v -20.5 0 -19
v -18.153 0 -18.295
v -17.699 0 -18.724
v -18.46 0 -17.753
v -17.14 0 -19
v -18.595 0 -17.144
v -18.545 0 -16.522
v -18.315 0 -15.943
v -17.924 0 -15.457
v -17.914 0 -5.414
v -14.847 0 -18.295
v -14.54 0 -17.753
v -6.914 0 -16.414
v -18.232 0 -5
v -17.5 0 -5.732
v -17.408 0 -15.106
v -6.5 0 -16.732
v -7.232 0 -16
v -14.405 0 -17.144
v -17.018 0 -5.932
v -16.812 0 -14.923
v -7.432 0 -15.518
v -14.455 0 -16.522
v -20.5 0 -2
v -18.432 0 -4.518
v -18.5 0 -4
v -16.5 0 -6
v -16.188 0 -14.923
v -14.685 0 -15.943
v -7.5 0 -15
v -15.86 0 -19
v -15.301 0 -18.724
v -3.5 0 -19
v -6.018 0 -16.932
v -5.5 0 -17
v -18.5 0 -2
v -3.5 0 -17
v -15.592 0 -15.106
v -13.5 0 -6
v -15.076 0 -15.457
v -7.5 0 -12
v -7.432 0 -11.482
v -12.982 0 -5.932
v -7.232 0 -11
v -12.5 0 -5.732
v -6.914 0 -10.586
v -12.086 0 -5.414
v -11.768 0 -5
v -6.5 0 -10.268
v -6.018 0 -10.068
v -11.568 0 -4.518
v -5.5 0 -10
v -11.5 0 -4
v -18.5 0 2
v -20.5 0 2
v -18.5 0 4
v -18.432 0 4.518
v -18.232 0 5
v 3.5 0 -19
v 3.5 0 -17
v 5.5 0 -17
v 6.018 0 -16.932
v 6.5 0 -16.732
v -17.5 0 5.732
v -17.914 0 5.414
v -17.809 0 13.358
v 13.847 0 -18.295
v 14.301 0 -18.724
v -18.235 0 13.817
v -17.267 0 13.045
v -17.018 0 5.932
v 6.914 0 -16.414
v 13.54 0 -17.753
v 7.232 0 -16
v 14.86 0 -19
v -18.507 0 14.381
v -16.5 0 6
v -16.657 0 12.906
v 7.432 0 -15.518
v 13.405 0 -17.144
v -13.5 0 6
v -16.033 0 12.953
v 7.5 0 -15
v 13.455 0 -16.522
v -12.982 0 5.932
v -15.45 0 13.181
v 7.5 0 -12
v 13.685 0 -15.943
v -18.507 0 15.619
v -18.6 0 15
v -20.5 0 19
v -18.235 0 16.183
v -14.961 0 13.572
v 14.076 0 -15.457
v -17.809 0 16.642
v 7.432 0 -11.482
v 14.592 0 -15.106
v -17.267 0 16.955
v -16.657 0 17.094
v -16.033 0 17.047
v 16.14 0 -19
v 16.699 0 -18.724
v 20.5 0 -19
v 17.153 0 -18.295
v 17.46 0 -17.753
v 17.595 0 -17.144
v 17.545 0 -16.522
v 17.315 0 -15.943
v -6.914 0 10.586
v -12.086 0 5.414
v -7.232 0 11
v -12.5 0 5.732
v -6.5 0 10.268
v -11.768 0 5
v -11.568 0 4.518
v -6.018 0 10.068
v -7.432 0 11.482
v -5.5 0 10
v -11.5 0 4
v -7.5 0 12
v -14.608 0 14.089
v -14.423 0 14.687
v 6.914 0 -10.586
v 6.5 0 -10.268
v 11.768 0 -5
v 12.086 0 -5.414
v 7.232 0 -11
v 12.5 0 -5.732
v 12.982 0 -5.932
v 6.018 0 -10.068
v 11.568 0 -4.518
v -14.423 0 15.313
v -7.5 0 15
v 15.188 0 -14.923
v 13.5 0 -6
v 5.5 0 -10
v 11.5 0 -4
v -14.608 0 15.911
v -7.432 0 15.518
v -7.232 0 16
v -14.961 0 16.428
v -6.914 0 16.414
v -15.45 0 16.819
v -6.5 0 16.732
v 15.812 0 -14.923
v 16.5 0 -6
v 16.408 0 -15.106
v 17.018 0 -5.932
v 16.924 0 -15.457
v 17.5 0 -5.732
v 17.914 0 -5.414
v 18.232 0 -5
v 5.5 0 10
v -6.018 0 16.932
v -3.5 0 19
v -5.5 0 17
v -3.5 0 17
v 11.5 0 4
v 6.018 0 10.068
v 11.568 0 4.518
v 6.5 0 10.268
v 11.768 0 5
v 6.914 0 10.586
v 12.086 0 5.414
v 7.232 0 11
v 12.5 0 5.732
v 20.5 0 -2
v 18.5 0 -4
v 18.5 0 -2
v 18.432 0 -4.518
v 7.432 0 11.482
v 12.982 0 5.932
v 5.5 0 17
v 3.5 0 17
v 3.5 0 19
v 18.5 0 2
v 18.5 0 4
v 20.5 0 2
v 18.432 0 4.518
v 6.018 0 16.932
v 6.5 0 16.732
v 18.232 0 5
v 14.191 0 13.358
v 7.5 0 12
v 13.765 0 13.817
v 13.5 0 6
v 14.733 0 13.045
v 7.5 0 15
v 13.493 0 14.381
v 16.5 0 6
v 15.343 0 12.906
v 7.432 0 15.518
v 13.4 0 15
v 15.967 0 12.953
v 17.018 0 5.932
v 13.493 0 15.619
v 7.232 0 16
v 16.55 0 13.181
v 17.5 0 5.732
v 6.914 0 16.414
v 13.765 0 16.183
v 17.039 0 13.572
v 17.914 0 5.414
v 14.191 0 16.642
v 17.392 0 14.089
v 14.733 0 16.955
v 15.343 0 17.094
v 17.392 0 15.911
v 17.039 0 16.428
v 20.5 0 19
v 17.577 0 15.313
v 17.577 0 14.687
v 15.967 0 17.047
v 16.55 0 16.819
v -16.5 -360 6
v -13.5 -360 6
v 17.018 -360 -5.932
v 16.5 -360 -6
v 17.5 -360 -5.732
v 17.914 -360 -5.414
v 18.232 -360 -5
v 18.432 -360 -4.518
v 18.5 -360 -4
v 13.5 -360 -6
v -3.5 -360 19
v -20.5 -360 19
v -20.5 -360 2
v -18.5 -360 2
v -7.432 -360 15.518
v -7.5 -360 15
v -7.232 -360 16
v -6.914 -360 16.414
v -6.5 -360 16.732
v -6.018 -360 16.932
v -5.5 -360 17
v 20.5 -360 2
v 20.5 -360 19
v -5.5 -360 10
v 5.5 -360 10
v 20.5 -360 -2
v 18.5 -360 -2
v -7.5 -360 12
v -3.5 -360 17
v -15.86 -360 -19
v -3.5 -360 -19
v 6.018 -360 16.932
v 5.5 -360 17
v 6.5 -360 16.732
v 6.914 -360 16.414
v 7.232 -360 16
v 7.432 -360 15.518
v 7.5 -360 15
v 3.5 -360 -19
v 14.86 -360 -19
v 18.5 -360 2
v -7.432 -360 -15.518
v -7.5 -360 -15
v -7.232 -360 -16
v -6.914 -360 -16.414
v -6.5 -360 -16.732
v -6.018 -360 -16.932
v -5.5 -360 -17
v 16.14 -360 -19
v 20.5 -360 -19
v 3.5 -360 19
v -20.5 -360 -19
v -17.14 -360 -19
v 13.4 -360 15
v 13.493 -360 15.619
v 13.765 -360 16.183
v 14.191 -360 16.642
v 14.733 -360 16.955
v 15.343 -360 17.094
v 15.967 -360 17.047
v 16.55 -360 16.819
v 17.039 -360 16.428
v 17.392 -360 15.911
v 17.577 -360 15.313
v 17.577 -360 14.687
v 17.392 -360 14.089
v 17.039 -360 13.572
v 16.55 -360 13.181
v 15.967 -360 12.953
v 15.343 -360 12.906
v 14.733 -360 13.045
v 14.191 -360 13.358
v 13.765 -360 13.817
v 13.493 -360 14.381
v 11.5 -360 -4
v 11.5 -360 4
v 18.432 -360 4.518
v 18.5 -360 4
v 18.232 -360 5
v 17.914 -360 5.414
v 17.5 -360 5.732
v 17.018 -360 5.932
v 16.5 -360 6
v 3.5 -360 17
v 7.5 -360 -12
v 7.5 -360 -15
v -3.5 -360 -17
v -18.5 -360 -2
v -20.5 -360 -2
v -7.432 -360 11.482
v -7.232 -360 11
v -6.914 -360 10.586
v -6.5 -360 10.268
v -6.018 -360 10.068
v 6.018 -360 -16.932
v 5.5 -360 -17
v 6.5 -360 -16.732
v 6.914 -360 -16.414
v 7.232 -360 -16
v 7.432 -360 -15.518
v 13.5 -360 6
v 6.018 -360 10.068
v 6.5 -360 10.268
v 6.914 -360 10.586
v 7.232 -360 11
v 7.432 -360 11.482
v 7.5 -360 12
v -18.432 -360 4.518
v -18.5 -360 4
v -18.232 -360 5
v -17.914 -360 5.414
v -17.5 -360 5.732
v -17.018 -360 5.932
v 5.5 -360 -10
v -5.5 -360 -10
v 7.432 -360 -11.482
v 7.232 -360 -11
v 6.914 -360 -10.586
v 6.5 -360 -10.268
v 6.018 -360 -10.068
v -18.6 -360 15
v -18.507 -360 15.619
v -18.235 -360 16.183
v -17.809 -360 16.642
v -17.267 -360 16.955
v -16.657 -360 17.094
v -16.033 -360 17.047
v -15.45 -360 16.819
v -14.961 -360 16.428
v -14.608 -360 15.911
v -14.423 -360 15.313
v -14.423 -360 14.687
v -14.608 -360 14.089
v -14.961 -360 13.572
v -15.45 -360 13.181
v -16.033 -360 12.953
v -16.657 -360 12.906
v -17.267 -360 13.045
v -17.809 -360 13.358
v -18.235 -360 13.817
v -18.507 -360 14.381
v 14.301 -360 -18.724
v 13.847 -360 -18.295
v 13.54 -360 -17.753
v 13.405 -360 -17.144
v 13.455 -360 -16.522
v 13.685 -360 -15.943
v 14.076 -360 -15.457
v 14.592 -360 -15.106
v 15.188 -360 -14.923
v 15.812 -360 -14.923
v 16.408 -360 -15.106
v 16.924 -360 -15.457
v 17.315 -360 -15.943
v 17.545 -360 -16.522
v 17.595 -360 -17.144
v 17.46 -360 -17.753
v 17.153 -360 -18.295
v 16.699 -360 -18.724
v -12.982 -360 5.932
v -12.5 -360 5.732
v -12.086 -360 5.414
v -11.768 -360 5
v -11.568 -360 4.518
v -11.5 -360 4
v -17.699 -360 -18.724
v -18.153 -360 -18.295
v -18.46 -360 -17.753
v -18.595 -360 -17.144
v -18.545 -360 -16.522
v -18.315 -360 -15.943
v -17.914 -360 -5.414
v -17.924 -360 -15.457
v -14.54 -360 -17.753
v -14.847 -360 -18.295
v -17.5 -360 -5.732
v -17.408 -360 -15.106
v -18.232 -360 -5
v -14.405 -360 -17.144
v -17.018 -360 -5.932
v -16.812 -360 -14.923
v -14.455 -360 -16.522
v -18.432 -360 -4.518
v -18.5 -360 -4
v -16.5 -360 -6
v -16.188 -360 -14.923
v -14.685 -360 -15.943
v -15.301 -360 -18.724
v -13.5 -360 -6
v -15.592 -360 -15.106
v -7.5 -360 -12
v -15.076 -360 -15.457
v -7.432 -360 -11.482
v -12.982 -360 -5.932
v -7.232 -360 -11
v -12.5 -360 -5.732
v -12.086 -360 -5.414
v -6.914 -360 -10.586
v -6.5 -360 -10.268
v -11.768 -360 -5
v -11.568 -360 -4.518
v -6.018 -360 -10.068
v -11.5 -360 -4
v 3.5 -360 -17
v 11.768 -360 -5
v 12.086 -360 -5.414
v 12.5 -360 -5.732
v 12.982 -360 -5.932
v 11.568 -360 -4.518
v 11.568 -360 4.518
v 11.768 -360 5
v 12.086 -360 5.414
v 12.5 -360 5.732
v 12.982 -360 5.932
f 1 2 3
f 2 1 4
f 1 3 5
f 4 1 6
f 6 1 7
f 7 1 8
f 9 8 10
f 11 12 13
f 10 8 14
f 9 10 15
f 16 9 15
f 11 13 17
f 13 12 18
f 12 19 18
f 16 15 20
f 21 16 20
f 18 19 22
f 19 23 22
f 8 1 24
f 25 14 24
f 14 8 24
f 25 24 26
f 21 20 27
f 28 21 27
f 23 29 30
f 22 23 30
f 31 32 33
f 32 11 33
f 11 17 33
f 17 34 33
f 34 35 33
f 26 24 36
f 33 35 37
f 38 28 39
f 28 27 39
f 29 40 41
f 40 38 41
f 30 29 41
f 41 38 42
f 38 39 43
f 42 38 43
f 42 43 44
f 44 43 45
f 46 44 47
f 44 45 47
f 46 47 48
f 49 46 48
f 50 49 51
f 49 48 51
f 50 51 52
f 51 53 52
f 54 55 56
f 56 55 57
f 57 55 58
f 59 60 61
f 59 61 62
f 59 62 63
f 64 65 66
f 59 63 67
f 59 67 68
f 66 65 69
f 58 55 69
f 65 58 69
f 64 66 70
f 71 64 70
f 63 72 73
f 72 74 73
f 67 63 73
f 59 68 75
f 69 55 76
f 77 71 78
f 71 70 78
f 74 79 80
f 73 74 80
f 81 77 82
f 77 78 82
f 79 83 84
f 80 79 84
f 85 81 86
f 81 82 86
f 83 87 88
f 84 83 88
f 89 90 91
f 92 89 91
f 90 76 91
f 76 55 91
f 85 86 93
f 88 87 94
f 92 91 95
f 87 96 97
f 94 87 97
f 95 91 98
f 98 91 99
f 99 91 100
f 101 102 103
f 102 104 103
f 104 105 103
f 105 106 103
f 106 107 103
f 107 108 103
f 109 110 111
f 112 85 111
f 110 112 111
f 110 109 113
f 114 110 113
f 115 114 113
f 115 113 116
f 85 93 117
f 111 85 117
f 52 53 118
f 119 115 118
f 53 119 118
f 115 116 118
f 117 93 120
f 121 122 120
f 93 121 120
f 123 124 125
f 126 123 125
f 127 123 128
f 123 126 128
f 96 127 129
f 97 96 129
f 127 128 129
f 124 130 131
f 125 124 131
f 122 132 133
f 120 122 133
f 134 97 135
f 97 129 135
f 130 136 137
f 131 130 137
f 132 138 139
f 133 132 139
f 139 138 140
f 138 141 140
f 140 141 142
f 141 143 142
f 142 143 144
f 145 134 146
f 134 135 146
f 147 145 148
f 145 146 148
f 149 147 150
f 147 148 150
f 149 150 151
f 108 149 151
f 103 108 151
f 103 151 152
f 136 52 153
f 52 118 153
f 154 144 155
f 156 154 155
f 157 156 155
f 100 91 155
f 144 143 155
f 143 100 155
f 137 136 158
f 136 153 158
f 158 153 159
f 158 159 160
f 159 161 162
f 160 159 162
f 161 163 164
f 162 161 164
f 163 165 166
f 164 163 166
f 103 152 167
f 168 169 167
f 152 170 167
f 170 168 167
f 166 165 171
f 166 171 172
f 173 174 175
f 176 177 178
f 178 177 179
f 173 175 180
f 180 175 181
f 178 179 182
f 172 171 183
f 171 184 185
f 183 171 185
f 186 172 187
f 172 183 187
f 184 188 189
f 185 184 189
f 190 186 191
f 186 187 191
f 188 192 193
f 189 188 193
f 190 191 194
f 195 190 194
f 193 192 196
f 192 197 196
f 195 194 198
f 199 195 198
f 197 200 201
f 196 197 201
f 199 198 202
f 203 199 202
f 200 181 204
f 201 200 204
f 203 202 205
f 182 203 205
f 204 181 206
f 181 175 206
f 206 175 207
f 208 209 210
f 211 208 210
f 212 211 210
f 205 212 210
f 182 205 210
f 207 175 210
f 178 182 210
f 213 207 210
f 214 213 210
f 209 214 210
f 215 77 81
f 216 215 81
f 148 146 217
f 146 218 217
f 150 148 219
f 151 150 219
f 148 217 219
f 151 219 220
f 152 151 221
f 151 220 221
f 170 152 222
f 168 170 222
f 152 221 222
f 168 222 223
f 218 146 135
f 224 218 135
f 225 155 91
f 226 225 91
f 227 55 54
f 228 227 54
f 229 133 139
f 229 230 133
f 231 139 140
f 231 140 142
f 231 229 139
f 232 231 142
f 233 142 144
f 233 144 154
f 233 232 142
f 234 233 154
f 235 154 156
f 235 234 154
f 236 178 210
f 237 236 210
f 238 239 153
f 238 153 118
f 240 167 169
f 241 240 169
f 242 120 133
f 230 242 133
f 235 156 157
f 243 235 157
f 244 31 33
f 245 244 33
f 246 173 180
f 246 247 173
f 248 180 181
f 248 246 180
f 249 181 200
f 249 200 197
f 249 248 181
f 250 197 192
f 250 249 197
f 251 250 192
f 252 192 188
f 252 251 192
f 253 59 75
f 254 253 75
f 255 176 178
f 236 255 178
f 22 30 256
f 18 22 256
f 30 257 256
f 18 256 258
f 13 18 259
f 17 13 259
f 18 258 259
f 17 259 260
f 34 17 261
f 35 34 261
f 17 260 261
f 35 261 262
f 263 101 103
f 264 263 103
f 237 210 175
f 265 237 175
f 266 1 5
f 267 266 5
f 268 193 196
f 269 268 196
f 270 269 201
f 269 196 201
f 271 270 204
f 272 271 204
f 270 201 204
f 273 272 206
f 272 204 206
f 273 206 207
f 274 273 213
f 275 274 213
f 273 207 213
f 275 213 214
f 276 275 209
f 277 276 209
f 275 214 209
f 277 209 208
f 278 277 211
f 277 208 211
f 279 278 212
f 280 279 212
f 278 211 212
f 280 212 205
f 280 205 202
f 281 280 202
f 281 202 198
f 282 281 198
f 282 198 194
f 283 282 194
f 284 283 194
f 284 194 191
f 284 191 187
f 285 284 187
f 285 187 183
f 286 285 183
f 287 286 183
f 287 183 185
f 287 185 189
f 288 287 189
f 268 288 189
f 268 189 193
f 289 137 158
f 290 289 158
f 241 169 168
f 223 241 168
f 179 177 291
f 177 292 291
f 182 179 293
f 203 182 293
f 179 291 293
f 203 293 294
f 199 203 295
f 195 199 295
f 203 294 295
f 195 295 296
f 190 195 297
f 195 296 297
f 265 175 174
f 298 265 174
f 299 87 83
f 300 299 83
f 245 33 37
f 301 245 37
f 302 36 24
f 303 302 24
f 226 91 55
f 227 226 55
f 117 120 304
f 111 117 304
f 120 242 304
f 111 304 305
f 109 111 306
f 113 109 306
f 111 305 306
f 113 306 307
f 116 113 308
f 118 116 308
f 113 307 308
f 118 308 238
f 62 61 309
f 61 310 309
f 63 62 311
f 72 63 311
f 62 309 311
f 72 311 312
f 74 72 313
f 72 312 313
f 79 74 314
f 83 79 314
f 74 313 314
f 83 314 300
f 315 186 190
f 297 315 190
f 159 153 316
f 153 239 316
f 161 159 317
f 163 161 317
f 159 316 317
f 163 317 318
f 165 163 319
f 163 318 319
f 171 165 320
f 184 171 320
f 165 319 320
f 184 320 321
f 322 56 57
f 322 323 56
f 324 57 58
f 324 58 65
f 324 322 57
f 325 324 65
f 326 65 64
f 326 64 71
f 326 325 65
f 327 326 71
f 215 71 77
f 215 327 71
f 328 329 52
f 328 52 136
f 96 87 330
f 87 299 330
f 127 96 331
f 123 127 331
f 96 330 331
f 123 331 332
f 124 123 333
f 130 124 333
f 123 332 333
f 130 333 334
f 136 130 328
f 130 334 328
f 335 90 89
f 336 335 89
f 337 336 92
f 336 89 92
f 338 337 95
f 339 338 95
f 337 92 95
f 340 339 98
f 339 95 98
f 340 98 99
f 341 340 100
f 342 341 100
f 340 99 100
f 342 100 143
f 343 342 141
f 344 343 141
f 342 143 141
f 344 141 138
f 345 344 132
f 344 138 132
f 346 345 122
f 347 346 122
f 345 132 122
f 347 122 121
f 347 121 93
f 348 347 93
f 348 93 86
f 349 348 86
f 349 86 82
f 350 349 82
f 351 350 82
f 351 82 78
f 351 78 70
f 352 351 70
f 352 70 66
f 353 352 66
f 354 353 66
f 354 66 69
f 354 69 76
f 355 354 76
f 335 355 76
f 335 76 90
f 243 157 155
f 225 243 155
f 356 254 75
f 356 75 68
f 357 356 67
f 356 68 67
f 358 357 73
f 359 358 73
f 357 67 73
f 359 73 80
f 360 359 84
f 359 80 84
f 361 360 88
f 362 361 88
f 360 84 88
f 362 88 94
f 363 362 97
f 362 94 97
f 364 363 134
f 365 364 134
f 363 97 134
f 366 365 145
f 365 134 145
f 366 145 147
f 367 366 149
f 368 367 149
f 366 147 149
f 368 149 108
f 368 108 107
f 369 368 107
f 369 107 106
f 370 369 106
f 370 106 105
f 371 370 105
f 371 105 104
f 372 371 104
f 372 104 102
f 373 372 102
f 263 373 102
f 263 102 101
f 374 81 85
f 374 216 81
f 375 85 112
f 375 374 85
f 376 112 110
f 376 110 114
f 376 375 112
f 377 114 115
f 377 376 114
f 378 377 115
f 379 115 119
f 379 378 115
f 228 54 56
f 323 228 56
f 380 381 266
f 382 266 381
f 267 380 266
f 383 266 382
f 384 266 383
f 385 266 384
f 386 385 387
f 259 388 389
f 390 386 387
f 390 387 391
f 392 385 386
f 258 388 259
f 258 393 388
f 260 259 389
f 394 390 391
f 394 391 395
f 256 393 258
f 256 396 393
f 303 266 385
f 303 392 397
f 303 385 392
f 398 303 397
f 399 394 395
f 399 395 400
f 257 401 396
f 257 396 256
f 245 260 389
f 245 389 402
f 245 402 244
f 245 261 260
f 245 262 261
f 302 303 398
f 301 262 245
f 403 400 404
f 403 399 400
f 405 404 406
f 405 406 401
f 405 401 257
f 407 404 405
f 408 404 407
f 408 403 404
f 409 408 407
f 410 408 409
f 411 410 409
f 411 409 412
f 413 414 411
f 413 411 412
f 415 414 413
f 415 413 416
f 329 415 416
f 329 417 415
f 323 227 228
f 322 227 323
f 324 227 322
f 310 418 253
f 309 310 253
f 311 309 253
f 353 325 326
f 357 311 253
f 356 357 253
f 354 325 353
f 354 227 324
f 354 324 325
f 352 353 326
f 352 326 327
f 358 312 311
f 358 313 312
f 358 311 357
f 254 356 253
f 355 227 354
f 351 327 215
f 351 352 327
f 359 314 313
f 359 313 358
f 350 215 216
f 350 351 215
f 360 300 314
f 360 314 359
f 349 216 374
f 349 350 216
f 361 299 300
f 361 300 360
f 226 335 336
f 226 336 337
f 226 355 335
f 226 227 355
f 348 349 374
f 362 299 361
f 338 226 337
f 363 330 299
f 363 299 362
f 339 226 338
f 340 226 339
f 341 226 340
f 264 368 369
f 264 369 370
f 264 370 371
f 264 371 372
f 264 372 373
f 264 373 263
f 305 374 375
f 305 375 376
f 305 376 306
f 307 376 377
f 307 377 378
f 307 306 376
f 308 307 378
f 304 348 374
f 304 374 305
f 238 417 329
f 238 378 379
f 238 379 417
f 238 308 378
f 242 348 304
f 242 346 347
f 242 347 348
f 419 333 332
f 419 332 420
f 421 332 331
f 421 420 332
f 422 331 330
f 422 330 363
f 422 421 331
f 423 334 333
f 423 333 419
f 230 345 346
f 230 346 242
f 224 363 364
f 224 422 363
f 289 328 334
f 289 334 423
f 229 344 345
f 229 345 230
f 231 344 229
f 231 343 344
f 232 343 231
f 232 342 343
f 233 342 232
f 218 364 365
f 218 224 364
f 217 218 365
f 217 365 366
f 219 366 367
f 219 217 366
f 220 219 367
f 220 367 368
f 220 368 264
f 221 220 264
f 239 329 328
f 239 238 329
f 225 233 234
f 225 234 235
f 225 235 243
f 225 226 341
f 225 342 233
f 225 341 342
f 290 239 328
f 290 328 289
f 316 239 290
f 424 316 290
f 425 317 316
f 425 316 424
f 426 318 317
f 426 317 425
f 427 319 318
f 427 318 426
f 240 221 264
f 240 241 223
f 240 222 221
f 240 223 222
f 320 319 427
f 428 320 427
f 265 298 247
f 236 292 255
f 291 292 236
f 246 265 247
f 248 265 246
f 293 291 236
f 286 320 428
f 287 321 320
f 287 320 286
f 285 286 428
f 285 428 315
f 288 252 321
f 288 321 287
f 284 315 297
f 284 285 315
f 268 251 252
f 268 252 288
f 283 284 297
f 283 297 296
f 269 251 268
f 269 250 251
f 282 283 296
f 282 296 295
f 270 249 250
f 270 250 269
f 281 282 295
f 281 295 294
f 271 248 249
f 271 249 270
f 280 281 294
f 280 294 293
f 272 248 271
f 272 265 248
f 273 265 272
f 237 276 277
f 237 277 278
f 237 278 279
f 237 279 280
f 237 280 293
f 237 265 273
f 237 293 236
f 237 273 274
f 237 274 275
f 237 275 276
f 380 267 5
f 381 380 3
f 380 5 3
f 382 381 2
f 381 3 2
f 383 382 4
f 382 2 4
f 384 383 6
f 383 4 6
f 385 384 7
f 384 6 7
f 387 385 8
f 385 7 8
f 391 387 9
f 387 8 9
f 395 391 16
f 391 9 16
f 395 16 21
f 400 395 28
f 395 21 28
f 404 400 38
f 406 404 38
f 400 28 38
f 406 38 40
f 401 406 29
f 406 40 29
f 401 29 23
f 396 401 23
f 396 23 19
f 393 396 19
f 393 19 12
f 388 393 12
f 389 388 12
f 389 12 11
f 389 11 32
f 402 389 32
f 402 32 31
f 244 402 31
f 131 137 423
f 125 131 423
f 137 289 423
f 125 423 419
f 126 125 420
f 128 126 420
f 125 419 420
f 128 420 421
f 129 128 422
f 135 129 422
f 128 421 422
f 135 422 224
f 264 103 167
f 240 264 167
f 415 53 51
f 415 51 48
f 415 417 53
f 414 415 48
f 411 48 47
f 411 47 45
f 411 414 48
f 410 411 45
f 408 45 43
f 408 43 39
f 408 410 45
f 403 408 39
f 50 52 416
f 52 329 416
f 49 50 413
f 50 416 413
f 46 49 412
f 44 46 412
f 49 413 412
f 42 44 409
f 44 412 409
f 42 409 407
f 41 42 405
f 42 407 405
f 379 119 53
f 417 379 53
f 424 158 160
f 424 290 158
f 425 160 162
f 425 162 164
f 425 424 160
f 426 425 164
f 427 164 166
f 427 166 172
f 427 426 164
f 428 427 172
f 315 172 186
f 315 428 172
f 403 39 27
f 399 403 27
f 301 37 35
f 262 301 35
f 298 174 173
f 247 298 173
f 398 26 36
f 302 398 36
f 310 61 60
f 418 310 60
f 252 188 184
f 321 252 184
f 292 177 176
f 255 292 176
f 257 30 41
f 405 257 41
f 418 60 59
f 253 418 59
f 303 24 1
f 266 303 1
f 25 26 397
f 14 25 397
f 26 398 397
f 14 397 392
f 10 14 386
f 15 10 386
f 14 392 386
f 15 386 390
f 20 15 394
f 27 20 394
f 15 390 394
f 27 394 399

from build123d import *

# Parameters (mm, degrees)
F1_DEPTH = 360
F3_D     = 4.2
F4_R     = 2
F5_R     = 2
F6_R     = 2
F7_R     = 2
F8_R     = 2
F9_R     = 2


with BuildPart() as f1:
    # F0 (on Front) → F1 (new body)
    with BuildSketch(Plane.XZ):
        Polygon((0, -10), (0, 0), (0, 10), (-7.5, 10), (-7.5, 17), (-3.5, 17), (-3.5, 19), (-20.5, 19), (-20.5, 2), (-18.5, 2), (-18.5, 6), (-11.5, 6), (-11.5, 0), (-11.5, -6), (-18.5, -6), (-18.5, -2), (-20.5, -2), (-20.5, -19), (-3.5, -19), (-3.5, -17), (-7.5, -17), (-7.5, -10), align=None)
        Polygon((0, 10), (0, 0), (0, -10), (7.5, -10), (7.5, -17), (3.5, -17), (3.5, -19), (20.5, -19), (20.5, -2), (18.5, -2), (18.5, -6), (11.5, -6), (11.5, 0), (11.5, 6), (18.5, 6), (18.5, 2), (20.5, 2), (20.5, 19), (3.5, 19), (3.5, 17), (7.5, 17), (7.5, 10), align=None)
    extrude(amount=F1_DEPTH)

    # F3 (through all)
    with Locations(Plane.XZ.offset(360)):
        with Locations((15.5, 15), (-16.5, 15), (15.5, -17), (-16.5, -17)):
            Hole(F3_D / 2)

    # F4
    f4_edges = [f1.edges().sort_by_distance(p)[0] for p in [
        (-7.5, -180, 10),
        (-18.5, -180, -6),
        (-7.5, -180, -17),
        (11.5, -180, -6),
    ]]
    fillet(f4_edges, radius=F4_R)

    # F5
    f5_edges = [f1.edges().sort_by_distance(p)[0] for p in [
        (7.5, -180, 10),
    ]]
    fillet(f5_edges, radius=F5_R)

    # F6
    f6_edges = [f1.edges().sort_by_distance(p)[0] for p in [
        (-11.5, -180, -6),
        (7.5, -180, -10),
        (18.5, -180, 6),
    ]]
    fillet(f6_edges, radius=F6_R)

    # F7
    f7_edges = [f1.edges().sort_by_distance(p)[0] for p in [
        (7.5, -180, -17),
        (18.5, -180, -6),
    ]]
    fillet(f7_edges, radius=F7_R)

    # F8
    f8_edges = [f1.edges().sort_by_distance(p)[0] for p in [
        (-7.5, -180, -10),
        (-18.5, -180, 6),
        (-7.5, -180, 17),
        (11.5, -180, 6),
    ]]
    fillet(f8_edges, radius=F8_R)

    # F9
    f9_edges = [f1.edges().sort_by_distance(p)[0] for p in [
        (-11.5, -180, 6),
        (7.5, -180, 17),
    ]]
    fillet(f9_edges, radius=F9_R)


solid = f1.part
